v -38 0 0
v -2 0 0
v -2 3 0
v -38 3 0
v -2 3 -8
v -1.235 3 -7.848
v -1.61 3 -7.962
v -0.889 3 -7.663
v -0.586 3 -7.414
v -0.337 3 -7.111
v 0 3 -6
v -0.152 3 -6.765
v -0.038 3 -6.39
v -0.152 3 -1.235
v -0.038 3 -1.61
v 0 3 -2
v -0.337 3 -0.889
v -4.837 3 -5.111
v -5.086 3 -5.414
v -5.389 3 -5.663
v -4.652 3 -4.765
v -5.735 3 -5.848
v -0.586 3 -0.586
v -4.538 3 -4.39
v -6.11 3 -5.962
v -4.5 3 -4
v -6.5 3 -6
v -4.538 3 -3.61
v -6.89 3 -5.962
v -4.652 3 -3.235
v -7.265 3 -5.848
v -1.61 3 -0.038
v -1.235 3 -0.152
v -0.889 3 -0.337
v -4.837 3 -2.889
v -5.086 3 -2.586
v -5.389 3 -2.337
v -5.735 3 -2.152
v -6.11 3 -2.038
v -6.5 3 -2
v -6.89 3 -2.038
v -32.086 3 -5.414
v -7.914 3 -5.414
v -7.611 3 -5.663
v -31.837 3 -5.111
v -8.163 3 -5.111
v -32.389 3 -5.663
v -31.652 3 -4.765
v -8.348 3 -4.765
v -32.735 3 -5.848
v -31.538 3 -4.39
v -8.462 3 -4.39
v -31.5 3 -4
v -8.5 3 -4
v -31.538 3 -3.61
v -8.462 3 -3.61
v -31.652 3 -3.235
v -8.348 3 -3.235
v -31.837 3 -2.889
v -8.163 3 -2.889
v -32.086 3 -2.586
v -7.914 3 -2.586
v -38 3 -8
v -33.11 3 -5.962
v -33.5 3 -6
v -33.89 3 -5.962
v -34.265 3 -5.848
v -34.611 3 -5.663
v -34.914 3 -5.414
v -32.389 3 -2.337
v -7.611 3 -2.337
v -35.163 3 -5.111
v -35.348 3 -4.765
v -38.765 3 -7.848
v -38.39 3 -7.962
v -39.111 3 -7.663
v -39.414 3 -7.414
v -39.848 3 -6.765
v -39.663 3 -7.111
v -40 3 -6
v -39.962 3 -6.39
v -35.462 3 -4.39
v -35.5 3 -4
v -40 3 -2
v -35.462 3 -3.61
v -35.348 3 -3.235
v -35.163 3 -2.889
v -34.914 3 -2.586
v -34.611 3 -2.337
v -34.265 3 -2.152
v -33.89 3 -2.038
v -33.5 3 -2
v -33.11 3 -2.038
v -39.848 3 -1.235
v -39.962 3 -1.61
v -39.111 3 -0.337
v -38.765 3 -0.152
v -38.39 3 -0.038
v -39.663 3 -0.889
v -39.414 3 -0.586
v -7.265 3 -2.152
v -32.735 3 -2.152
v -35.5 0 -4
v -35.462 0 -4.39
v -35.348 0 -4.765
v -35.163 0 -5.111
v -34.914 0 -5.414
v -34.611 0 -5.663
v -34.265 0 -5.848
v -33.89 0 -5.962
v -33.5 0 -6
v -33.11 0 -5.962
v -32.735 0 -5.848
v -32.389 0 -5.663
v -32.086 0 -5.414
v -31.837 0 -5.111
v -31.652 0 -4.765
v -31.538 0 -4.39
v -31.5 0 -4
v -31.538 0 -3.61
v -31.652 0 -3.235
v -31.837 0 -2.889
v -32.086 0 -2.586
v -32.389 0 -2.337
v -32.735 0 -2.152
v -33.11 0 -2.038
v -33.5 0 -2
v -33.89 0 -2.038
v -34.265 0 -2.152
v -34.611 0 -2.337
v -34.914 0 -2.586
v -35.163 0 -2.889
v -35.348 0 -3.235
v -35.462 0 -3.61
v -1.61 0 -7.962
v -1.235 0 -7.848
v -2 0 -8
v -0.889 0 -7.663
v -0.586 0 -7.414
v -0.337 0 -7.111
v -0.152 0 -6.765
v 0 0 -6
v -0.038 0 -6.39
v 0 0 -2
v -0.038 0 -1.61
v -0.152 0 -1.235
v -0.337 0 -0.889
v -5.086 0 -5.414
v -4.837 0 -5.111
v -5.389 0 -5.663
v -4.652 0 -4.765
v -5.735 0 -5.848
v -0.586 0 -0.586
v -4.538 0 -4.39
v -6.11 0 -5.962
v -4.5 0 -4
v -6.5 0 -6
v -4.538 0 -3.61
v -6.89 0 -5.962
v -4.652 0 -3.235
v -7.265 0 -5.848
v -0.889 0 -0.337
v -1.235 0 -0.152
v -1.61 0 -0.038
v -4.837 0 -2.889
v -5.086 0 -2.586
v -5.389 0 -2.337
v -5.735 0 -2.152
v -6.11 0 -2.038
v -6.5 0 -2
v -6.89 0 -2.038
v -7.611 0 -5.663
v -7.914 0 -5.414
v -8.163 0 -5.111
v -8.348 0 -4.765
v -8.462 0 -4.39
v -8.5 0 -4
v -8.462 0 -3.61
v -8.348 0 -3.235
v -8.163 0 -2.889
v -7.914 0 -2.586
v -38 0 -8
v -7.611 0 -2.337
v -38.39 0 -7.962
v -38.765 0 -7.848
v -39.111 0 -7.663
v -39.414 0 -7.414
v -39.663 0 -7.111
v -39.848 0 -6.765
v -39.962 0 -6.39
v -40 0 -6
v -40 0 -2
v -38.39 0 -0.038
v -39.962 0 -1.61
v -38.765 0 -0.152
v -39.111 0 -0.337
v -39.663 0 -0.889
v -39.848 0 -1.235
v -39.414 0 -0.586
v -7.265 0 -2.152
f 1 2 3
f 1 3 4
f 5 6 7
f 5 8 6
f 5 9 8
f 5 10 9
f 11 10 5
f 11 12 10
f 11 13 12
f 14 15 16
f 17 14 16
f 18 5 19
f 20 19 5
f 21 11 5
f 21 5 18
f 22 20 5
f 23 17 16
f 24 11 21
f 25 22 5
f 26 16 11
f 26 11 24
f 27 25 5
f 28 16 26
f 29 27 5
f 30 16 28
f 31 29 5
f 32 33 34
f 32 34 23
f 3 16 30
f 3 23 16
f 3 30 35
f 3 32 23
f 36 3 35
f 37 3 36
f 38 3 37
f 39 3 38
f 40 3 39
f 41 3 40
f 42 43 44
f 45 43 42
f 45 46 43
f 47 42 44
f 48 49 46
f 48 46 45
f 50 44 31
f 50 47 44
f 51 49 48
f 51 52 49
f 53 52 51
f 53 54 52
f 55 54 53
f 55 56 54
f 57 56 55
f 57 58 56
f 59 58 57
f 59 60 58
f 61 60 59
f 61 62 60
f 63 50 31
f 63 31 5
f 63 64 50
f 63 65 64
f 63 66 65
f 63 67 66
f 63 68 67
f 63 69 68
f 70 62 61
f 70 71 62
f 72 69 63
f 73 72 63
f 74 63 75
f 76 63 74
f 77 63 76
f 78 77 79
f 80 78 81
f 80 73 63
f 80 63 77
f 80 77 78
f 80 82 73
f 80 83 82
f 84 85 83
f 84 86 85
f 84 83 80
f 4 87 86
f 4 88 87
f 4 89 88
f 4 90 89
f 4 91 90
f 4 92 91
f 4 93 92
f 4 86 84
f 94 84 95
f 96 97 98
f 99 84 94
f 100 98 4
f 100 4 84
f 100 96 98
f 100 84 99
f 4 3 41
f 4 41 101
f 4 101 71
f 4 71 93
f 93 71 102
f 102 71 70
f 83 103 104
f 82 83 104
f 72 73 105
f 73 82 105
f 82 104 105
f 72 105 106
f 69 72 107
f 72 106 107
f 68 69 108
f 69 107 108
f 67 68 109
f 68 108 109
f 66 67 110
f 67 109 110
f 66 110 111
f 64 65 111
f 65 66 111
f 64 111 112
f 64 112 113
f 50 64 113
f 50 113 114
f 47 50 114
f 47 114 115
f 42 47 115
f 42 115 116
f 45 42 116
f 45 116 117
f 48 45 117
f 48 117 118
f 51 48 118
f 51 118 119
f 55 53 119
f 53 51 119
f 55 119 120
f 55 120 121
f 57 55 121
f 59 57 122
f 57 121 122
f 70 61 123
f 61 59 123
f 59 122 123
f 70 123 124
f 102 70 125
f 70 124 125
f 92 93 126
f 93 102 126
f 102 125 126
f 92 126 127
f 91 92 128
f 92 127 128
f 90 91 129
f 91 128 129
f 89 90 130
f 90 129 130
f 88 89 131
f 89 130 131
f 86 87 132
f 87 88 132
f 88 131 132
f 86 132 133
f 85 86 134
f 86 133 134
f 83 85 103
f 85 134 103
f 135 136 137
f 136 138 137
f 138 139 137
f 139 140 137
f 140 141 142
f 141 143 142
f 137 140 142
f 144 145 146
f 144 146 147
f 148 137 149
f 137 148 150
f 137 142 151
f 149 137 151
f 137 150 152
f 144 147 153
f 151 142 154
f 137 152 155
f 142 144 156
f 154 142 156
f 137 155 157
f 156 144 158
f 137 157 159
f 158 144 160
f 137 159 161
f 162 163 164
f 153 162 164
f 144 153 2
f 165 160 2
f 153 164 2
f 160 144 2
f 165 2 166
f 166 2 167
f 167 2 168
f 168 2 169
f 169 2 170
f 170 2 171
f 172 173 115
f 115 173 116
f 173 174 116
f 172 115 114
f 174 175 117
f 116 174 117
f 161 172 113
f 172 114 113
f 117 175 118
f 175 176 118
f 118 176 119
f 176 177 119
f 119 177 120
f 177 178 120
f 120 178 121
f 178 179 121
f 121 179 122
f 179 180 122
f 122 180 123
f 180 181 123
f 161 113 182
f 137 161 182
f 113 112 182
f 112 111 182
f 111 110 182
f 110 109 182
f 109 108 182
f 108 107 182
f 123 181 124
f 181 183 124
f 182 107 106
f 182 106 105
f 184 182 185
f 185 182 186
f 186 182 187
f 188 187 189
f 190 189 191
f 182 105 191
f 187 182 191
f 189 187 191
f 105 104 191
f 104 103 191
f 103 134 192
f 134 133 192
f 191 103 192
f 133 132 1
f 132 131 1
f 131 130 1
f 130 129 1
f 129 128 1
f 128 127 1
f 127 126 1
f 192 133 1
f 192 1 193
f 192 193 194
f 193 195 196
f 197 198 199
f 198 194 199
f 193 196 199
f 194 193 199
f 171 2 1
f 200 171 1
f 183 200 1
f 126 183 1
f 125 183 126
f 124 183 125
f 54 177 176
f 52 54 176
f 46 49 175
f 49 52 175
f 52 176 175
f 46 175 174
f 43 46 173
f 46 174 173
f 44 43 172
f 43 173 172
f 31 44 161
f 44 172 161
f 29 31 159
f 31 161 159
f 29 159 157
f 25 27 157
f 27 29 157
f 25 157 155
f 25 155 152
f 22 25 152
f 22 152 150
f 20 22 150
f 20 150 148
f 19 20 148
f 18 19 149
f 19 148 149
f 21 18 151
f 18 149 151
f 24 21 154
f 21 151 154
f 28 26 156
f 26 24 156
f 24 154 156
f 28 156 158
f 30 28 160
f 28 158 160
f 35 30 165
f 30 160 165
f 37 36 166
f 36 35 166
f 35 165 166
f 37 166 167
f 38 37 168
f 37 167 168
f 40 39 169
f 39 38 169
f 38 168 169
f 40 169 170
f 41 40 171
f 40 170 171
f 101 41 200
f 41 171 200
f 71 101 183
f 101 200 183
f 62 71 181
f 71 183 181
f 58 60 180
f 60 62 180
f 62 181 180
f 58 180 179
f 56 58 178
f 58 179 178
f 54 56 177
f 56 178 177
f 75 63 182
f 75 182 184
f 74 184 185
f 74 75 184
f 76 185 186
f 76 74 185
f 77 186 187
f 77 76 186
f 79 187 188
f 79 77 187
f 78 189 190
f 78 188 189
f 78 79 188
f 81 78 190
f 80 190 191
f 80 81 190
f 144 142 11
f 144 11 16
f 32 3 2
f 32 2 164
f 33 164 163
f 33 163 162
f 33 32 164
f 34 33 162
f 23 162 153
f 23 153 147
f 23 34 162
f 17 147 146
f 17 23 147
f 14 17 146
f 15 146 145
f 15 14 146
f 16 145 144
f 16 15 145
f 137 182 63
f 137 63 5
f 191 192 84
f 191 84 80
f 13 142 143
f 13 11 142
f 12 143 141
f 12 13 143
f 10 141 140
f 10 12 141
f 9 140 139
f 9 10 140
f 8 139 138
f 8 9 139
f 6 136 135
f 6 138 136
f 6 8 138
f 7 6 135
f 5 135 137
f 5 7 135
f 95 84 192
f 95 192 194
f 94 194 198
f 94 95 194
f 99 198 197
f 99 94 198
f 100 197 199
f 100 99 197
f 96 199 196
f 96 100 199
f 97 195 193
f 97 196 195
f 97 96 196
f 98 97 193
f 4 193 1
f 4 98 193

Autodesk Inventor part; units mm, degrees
ref_plane "YZ Plane" through (0, 0, 0) normal (1, 0, 0) x (0, 1, 0)
ref_plane "XZ Plane" through (0, 0, 0) normal (0, 1, 0) x (-1, 0, 0)
ref_plane "XY Plane" through (0, 0, 0) normal (0, 0, 1) x (1, 0, 0)
sketch "Esquisse1" plane through (0, 0, 0) normal (0, 1, 0) x (-1, 0, 0)
  line L0 (0, 0) -> (40, 0)
  line L1 (40, 0) -> (40, -8)
  line L2 (40, -8) -> (0, -8)
  line L3 (0, -8) -> (0, 0)
  line L4 (40, -4) -> (0, -4) construction
  line L5 (20, 0) -> (20, -8) construction
  circle A0 centre (33.5, -4) radius 2
  circle A1 centre (6.5, -4) radius 2
  dimension "d0" = 8
  dimension "d1" = 40
  dimension "d2" = 27
  dimension "d3" = 4
extrude "Extrusion1" add sketch "Esquisse1" along normal blind 3
fillet "Congé1" radius 2 4 edges at (0, 1.5, 0) (0, 1.5, -8) (-40, 1.5, -8) (-40, 1.5, 0)
properties part number "cell"
